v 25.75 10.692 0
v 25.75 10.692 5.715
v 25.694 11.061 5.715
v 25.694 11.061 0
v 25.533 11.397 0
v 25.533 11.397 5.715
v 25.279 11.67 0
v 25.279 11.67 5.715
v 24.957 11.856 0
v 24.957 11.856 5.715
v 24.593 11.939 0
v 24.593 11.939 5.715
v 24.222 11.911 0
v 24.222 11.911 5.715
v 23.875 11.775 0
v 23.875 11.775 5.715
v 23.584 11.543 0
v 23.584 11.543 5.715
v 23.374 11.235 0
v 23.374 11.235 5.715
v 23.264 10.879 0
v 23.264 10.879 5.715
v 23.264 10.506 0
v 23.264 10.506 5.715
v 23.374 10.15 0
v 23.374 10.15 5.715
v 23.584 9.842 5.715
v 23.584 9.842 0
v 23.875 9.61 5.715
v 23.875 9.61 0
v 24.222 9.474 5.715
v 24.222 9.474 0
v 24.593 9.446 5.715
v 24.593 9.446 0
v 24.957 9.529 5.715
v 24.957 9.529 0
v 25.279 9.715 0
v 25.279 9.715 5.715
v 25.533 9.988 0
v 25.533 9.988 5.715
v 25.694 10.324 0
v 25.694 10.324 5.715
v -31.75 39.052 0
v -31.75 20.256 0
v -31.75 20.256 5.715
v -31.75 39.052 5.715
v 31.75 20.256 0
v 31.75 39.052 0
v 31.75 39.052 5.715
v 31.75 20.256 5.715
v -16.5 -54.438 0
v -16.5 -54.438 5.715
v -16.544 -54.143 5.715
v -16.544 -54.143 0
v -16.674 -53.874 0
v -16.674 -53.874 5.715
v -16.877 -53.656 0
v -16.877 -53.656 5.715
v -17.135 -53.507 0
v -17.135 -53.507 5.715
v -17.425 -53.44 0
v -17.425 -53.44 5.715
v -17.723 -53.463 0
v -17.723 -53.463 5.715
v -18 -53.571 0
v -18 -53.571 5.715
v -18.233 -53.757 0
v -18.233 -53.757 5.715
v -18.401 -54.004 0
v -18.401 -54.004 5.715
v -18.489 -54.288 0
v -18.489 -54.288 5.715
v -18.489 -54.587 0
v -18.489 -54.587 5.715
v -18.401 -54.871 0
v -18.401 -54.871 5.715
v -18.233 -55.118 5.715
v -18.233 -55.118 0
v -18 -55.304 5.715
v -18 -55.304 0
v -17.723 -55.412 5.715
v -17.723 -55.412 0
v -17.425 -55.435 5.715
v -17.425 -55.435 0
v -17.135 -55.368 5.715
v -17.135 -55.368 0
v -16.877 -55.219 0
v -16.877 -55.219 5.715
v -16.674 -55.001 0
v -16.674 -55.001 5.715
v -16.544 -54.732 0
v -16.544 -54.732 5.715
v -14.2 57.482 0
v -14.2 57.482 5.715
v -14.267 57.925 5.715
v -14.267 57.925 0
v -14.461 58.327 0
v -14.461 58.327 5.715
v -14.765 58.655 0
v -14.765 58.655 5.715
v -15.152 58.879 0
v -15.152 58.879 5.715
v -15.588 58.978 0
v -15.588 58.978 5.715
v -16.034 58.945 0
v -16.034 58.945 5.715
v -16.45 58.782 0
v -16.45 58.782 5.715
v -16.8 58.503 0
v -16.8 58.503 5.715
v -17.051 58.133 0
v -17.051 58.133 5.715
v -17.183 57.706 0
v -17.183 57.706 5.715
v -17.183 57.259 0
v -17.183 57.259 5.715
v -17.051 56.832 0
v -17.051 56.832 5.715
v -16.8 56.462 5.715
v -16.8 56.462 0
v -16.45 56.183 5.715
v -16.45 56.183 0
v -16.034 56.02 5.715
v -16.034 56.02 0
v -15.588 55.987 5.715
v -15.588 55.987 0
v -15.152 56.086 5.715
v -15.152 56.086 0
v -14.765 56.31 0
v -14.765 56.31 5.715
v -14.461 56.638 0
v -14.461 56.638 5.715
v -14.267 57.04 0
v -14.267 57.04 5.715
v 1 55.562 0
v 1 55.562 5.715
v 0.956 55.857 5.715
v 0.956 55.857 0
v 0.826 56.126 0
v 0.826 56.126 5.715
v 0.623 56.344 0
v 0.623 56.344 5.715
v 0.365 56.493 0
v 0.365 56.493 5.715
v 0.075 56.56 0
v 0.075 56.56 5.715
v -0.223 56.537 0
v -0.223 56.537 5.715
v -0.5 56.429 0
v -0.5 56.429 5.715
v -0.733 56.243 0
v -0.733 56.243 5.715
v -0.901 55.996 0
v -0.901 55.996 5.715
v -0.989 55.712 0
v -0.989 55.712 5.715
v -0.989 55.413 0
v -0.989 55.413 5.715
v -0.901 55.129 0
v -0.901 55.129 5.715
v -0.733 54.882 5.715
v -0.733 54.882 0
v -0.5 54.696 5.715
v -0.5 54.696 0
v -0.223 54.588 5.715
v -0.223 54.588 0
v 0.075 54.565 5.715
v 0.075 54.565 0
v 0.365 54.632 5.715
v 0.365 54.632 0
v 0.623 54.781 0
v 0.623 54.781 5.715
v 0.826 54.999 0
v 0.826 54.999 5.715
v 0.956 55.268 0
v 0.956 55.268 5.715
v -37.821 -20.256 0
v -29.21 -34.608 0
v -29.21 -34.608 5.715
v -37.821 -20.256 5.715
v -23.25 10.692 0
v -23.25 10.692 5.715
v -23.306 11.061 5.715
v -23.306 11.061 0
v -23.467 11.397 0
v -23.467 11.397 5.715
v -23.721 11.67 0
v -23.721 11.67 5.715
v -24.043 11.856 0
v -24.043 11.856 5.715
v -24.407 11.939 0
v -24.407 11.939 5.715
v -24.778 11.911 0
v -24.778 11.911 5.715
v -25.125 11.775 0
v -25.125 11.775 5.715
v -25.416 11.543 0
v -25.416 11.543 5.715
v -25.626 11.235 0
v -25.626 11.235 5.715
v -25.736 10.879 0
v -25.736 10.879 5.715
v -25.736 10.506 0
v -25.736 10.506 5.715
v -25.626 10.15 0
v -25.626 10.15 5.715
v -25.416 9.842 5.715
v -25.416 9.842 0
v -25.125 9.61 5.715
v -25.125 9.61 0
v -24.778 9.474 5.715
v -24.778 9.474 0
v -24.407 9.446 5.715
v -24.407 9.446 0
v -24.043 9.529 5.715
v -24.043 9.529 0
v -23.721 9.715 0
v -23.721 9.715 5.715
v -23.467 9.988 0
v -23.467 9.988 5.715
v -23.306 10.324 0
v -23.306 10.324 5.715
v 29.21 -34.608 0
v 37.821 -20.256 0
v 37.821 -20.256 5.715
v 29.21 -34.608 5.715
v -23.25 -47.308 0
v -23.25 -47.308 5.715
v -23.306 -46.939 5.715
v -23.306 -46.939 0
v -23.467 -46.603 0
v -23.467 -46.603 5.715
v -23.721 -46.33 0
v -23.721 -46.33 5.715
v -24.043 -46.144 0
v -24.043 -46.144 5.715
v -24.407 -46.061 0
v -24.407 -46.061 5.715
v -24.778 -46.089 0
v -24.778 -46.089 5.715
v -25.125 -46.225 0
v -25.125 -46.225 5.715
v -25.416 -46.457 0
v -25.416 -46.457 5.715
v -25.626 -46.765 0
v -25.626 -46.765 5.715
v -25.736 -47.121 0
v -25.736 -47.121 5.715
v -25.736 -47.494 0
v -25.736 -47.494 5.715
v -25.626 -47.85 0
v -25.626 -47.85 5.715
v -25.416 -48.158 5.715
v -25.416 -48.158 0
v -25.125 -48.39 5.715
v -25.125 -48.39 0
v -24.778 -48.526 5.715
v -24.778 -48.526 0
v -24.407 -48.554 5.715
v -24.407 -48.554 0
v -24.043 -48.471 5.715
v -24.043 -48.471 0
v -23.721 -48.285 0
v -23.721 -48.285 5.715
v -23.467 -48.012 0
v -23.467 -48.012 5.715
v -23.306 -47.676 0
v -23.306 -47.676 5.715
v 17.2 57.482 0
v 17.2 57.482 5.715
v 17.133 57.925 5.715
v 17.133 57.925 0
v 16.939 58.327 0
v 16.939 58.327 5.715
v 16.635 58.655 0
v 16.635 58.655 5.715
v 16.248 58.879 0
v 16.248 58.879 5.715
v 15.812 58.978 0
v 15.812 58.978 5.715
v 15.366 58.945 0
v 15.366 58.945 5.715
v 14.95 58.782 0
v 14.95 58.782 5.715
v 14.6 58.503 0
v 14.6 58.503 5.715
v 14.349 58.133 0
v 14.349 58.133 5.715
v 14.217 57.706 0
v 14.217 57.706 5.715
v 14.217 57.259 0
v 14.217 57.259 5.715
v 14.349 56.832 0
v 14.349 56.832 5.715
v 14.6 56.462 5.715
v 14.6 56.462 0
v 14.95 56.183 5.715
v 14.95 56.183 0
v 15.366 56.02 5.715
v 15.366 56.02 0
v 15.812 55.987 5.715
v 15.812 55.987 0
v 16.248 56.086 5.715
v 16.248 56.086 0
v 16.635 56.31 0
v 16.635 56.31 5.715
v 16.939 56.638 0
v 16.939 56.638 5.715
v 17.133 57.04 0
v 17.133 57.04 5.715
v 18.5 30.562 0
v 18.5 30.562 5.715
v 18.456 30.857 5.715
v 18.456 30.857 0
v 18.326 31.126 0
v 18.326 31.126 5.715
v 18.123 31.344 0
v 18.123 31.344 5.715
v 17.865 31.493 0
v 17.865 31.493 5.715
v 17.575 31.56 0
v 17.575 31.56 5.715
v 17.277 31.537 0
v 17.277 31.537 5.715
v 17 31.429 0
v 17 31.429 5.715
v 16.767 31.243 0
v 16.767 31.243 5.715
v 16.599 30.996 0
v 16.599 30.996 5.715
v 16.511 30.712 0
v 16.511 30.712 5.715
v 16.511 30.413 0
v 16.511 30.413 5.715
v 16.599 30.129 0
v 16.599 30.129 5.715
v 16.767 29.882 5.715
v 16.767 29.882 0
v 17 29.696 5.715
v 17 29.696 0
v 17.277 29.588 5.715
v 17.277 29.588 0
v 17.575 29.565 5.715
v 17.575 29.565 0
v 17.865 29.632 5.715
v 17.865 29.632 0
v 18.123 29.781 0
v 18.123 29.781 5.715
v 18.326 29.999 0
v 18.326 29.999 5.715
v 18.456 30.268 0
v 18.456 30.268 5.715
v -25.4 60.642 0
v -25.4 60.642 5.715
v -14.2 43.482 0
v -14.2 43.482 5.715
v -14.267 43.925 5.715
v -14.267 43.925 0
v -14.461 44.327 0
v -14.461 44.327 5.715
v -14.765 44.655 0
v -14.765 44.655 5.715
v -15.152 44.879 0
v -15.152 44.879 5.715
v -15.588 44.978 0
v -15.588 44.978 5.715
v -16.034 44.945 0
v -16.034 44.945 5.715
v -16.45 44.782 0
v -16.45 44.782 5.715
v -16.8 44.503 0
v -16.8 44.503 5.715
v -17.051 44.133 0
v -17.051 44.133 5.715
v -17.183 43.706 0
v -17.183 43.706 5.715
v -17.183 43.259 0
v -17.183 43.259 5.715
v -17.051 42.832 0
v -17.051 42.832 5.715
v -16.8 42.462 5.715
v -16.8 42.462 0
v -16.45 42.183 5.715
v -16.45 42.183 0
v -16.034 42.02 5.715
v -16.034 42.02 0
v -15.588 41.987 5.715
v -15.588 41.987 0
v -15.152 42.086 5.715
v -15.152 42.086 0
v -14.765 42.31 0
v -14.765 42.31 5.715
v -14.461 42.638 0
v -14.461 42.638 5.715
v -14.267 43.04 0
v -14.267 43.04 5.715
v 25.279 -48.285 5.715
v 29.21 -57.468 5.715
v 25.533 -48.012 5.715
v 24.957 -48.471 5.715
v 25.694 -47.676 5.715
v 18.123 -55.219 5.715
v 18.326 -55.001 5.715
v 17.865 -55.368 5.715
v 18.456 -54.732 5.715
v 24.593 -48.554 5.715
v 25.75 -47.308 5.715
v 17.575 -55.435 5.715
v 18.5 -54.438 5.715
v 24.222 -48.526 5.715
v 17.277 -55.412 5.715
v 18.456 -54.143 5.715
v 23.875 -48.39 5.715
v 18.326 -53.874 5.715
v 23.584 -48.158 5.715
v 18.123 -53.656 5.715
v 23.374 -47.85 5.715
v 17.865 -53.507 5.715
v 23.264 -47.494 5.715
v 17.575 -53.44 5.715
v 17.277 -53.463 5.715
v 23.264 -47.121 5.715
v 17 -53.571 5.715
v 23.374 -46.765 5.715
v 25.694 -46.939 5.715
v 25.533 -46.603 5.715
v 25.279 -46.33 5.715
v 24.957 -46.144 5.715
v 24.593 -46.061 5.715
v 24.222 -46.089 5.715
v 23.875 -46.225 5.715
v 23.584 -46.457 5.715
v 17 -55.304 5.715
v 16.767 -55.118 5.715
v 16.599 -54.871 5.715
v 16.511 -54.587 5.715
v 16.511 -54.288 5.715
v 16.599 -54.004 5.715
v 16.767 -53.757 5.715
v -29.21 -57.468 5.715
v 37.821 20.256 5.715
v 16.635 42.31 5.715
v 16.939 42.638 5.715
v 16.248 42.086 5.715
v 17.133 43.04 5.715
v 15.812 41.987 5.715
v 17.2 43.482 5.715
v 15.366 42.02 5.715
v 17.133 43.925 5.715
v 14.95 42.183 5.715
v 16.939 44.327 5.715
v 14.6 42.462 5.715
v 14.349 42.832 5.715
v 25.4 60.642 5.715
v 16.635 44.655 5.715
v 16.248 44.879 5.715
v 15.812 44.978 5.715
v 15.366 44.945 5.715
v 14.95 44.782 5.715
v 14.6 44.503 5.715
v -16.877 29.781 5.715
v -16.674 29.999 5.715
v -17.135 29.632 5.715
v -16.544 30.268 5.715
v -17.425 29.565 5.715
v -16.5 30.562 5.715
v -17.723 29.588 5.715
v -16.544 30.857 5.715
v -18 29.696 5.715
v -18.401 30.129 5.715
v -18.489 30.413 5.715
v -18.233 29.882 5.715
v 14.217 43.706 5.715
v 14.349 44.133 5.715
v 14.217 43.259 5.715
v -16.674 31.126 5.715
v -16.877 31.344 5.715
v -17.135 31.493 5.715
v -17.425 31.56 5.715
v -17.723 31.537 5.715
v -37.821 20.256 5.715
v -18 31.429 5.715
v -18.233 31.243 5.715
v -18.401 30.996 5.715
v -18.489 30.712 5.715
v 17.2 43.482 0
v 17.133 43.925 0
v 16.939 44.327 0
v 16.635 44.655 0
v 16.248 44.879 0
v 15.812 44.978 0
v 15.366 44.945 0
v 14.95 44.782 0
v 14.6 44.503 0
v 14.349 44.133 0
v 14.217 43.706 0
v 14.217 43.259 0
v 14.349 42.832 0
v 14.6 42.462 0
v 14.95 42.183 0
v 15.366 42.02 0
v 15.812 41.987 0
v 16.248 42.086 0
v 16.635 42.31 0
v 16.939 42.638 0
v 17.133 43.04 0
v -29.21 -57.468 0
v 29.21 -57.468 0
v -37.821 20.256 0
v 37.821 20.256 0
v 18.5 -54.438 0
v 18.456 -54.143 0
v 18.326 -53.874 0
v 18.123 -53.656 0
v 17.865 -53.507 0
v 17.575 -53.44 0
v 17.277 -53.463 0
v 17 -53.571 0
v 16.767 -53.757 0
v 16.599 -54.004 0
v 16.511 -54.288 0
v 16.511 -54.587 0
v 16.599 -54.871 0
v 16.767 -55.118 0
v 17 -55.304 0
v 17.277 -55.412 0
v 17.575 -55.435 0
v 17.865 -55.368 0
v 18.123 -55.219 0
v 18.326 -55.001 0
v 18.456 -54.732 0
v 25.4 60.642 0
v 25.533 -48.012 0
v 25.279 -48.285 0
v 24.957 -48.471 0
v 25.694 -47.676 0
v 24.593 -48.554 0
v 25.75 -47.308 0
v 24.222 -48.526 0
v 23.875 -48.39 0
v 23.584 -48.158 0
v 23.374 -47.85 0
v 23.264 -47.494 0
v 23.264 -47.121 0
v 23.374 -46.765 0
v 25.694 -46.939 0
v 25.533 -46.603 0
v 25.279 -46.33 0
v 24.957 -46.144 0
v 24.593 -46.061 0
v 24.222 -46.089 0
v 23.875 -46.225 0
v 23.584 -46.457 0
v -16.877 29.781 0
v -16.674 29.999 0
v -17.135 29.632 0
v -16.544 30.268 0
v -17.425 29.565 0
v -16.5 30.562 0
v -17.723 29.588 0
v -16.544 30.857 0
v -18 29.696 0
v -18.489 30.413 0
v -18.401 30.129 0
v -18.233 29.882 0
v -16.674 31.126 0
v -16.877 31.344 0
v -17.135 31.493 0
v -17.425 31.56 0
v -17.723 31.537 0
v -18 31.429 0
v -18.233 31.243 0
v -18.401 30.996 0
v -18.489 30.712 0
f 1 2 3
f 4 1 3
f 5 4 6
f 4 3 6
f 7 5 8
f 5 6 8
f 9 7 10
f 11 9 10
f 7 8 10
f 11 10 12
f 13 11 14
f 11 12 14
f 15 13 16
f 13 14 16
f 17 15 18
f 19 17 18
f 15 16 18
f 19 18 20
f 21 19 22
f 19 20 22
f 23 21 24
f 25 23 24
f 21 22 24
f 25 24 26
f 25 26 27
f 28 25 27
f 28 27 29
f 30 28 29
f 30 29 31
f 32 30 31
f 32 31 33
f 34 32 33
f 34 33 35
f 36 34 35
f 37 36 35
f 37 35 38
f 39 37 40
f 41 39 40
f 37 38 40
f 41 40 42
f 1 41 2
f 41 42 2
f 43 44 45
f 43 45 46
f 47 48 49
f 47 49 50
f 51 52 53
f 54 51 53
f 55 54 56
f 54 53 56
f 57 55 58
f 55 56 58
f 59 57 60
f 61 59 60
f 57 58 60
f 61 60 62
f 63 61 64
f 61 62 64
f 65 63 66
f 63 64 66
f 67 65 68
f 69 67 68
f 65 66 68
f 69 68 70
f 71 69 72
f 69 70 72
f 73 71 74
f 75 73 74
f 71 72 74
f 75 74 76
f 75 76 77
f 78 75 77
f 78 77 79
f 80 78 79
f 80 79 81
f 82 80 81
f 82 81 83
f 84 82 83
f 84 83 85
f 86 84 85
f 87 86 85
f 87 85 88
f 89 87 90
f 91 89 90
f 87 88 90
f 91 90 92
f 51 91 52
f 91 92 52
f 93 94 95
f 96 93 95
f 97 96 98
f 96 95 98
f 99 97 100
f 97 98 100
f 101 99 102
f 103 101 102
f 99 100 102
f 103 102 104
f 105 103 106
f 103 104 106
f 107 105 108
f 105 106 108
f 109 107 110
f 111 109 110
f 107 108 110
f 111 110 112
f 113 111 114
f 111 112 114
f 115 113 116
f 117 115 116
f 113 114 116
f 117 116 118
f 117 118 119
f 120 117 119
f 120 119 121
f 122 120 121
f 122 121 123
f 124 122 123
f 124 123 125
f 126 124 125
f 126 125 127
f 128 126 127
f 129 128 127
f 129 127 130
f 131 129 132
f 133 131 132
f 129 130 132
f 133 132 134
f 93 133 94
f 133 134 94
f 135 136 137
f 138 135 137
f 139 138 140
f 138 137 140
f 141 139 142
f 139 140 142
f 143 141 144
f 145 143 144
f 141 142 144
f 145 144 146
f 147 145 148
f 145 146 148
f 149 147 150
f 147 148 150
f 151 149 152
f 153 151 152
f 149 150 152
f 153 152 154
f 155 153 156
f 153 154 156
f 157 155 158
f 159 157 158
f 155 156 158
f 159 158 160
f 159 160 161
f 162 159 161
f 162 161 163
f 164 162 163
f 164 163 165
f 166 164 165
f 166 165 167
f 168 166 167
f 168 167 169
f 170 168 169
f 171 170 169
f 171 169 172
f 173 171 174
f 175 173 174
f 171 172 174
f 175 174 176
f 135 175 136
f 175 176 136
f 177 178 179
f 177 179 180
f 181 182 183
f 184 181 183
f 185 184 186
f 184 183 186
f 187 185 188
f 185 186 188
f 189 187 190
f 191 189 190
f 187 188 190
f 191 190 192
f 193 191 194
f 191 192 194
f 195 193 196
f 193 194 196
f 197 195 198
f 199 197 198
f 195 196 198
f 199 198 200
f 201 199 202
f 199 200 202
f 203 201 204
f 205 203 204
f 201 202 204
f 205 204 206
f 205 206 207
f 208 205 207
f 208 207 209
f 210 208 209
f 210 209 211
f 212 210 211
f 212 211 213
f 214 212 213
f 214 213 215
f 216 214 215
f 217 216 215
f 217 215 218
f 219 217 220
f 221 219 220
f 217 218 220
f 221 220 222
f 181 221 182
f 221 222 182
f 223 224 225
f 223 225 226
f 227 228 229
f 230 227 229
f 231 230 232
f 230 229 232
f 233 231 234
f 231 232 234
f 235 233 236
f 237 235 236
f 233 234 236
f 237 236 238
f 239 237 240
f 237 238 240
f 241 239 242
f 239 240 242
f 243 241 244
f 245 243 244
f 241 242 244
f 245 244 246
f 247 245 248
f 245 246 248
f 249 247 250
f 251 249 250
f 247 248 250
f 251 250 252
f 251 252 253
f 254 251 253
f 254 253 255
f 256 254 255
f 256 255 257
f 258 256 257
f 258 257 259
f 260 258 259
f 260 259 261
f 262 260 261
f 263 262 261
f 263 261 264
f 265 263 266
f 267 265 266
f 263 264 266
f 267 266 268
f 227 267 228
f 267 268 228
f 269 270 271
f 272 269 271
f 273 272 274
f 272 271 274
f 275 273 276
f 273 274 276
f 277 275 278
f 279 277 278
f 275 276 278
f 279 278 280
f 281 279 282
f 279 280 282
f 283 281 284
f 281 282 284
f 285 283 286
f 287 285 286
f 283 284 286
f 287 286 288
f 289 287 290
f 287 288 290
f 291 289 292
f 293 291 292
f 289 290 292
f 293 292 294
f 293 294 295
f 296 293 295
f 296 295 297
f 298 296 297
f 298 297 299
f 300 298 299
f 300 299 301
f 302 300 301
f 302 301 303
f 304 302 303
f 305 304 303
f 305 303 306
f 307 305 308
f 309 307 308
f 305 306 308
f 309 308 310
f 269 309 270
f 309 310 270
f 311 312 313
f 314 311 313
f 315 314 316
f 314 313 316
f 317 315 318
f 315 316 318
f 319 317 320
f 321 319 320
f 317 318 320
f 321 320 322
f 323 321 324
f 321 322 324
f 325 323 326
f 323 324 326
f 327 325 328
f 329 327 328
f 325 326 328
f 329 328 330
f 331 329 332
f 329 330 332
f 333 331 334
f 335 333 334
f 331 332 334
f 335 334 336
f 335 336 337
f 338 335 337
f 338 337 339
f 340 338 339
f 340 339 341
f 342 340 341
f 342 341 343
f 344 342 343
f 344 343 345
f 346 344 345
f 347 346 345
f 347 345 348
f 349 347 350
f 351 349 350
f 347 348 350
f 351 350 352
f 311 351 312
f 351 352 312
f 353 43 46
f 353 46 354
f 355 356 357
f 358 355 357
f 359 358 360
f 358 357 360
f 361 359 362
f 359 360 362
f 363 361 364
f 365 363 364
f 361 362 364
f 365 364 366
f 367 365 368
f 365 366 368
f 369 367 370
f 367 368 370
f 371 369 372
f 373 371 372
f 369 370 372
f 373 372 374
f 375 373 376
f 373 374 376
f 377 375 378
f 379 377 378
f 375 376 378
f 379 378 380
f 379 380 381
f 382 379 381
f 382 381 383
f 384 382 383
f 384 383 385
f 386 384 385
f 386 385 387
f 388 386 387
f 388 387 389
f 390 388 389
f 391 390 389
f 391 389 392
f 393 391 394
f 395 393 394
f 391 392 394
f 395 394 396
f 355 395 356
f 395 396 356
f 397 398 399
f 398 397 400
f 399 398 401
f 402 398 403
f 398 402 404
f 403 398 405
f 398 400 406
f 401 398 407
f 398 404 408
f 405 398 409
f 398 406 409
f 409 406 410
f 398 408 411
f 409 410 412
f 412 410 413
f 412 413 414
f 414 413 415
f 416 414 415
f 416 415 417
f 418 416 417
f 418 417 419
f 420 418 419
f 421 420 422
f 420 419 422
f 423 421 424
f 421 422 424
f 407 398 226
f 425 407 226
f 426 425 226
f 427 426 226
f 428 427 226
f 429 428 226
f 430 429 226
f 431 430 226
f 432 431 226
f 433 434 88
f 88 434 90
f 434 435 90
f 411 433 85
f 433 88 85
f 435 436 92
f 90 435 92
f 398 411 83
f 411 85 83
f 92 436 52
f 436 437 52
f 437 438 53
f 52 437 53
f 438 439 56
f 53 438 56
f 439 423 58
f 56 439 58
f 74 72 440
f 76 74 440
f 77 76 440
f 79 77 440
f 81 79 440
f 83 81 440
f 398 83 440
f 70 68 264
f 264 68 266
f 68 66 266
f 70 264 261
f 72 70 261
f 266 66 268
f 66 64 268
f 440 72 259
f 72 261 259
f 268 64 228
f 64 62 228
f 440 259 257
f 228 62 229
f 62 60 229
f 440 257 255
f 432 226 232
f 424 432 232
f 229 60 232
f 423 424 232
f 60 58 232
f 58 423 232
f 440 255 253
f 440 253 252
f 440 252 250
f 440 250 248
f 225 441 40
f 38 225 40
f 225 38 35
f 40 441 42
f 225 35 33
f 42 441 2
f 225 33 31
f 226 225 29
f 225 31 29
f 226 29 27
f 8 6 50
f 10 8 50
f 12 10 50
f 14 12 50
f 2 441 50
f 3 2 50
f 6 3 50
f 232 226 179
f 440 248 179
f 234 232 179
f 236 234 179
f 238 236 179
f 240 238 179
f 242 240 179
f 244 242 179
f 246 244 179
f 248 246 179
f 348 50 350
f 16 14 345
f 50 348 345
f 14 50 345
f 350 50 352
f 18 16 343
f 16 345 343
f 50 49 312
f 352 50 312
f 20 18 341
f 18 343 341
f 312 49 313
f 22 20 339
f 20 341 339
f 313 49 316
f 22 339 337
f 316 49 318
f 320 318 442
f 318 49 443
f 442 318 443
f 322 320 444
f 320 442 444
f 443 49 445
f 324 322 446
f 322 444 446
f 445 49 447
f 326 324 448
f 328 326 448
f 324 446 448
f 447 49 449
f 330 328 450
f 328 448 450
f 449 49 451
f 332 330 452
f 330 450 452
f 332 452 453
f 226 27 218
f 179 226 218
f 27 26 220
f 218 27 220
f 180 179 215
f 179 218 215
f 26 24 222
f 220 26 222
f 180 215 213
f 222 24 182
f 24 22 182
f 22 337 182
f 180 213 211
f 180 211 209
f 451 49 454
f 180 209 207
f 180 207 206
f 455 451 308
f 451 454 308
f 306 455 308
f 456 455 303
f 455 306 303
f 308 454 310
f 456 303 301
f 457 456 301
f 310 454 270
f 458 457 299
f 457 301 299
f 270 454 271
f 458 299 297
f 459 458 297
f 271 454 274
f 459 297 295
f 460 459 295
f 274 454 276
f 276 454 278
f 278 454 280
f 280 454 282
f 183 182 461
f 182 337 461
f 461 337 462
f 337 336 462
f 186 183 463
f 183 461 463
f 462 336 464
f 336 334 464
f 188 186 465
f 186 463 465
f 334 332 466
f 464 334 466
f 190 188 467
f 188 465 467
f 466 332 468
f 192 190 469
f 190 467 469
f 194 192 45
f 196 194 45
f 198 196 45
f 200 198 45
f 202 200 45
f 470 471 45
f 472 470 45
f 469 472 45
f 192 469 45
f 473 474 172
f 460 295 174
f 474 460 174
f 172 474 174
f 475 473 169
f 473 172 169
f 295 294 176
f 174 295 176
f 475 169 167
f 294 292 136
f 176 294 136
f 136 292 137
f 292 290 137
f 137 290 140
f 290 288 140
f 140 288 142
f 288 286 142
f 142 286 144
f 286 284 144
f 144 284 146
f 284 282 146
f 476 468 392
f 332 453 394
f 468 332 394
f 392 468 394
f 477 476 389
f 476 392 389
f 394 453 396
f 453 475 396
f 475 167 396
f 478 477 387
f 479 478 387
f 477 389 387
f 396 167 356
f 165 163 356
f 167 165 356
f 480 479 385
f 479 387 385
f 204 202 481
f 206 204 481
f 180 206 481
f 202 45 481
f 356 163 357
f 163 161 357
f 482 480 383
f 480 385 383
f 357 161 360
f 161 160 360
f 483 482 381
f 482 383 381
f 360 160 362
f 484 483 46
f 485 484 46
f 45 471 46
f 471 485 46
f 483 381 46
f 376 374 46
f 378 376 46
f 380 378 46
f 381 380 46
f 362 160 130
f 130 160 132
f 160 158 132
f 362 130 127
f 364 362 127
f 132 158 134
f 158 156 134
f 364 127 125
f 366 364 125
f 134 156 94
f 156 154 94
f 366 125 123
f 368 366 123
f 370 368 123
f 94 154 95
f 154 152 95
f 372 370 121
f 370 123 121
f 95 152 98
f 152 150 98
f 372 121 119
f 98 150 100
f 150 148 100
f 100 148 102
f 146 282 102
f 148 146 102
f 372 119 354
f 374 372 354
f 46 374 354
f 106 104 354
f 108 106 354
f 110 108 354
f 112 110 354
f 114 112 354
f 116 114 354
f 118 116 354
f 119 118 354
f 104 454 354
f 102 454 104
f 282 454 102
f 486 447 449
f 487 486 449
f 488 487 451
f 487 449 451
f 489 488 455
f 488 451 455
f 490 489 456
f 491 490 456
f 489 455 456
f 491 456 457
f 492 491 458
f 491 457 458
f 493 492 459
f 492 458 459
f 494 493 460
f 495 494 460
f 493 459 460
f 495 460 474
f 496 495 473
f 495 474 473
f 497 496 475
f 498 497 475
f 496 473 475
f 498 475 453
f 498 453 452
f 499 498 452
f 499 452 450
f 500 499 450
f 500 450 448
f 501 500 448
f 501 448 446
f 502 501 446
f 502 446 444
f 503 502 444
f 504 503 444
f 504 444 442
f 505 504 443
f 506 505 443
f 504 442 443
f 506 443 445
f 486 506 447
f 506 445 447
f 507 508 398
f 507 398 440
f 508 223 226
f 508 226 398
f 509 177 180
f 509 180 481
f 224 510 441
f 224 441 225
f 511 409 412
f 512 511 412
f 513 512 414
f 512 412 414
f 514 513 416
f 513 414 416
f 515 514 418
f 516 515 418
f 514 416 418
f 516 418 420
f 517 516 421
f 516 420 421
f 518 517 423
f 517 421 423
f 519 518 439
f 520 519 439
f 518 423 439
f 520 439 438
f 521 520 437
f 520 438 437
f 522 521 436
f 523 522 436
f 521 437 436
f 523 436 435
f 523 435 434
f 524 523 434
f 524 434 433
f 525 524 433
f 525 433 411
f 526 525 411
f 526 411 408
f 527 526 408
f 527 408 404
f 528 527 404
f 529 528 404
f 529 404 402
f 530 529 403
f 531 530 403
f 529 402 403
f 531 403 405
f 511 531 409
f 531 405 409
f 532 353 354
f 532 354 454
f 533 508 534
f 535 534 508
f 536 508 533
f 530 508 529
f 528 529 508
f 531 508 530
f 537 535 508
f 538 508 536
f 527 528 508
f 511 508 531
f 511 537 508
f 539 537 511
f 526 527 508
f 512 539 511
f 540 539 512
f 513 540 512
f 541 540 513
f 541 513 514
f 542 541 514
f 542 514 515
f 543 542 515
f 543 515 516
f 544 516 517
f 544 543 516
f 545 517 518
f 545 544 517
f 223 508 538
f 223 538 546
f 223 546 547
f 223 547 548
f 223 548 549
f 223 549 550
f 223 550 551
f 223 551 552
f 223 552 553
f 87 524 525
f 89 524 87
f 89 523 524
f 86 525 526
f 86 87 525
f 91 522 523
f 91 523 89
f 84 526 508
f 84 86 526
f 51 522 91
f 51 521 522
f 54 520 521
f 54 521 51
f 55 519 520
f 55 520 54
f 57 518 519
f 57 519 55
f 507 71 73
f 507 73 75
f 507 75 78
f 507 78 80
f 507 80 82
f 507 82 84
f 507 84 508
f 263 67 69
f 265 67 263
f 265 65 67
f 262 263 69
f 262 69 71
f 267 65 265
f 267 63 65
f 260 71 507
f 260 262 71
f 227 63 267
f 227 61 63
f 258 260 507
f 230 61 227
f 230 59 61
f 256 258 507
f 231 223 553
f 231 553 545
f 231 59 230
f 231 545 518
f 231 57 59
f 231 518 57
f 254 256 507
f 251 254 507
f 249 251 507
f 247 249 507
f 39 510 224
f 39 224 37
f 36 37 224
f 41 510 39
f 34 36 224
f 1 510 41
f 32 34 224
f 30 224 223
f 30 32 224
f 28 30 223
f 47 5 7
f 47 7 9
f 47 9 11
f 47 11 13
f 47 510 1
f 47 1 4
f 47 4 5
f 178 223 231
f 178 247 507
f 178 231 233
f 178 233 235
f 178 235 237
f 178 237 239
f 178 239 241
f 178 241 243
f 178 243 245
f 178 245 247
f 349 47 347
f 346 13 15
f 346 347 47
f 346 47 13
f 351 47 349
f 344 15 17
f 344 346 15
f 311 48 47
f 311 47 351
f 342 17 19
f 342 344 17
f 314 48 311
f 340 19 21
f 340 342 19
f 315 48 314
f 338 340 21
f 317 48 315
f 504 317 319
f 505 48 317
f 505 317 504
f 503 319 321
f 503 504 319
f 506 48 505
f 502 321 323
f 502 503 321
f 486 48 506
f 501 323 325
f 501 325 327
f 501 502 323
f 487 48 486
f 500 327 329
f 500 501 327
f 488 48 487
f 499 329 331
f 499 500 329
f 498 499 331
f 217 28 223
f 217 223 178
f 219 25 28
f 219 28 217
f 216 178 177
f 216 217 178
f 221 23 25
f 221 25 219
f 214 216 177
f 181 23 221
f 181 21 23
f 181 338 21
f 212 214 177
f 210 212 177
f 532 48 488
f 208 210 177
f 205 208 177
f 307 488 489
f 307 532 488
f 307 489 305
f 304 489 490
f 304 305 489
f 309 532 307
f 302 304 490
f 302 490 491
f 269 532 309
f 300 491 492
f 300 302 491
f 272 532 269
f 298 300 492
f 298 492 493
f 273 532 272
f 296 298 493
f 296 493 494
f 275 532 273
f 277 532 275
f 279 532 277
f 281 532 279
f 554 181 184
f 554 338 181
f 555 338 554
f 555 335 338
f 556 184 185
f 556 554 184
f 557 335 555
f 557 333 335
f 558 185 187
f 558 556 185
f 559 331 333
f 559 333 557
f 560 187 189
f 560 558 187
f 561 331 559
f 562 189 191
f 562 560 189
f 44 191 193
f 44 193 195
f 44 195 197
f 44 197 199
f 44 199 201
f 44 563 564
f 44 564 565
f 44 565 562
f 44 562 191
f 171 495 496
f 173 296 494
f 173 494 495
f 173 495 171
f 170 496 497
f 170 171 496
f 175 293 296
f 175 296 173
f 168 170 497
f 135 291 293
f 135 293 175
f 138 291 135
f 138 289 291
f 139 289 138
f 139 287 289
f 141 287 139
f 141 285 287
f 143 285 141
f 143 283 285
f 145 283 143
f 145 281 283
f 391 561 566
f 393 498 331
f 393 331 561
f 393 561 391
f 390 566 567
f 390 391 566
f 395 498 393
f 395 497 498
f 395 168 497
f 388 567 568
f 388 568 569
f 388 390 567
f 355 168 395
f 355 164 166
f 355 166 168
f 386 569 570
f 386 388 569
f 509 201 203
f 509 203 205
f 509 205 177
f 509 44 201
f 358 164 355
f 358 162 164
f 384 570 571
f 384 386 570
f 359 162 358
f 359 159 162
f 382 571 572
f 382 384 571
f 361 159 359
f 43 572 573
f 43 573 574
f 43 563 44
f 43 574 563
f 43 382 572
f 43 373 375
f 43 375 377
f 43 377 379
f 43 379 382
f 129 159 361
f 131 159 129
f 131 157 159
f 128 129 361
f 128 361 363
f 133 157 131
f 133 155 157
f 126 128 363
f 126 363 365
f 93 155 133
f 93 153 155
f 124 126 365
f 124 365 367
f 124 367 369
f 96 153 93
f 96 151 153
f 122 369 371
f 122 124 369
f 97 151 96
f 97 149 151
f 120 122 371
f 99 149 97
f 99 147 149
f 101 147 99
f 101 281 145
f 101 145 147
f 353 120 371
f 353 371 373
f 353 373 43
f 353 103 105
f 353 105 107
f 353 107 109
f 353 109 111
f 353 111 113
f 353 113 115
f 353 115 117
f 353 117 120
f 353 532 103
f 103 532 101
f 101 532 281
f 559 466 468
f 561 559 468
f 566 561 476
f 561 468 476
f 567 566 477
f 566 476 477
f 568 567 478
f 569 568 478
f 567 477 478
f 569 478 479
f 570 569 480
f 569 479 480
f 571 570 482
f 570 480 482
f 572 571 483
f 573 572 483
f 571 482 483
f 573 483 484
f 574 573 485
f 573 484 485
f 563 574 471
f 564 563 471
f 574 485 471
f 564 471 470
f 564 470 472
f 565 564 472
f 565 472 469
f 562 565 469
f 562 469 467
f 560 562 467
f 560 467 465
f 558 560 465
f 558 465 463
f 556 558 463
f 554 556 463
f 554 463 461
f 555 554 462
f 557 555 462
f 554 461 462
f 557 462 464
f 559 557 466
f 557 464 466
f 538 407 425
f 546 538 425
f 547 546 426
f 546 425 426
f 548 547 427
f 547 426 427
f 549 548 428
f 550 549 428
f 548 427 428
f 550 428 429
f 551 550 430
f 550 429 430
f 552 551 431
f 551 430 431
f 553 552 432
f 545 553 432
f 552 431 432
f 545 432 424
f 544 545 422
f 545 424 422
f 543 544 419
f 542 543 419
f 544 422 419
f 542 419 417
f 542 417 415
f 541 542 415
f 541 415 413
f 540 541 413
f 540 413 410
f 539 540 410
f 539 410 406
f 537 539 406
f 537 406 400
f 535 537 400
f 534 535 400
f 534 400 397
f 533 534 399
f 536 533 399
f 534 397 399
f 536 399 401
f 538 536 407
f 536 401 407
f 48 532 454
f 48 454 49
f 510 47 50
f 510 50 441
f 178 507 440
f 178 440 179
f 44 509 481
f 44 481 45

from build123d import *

# Parameters (mm, degrees)
BOSS_EXTRUDE1_DEPTH = 5.715
SKETCH3_R           = 1.25
SKETCH3_R_2         = 1
SKETCH3_R_3         = 1.5
CUT_EXTRUDE1_DEPTH  = 5.715


with BuildPart() as part:
    # Sketch1 → Boss-Extrude1 (new body)
    with BuildSketch(Plane.XY):
        Polygon((-37.8206, -20.2565), (-37.8206, 20.2565), (-31.75, 20.2565), (-31.75, 39.0525), (-25.4, 60.6425), (25.4, 60.6425), (31.75, 39.0525), (31.75, 20.2565), (37.8206, 20.2565), (37.8206, -20.2565), (29.21, -34.6075), (29.21, -57.4675), (-29.21, -57.4675), (-29.21, -34.6075), align=None)
    extrude(amount=BOSS_EXTRUDE1_DEPTH)

    # Sketch3 → Cut-Extrude1 (cut)
    with BuildSketch(Plane.XY.offset(5.715)):
        with Locations((-24.5, 10.6925)):
            Circle(SKETCH3_R)
        with Locations((24.5, 10.6925)):
            Circle(SKETCH3_R)
        with Locations((-24.5, -47.3075)):
            Circle(SKETCH3_R)
        with Locations((24.5, -47.3075)):
            Circle(SKETCH3_R)
        with Locations((0, 55.5625)):
            Circle(SKETCH3_R_2)
        with Locations((17.5, 30.5625)):
            Circle(SKETCH3_R_2)
        with Locations((-17.5, 30.5625)):
            Circle(SKETCH3_R_2)
        with Locations((-17.5, -54.4375)):
            Circle(SKETCH3_R_2)
        with Locations((17.5, -54.4375)):
            Circle(SKETCH3_R_2)
        with Locations((-15.7, 57.48249997)):
            Circle(SKETCH3_R_3)
        with Locations((15.7, 57.48249997)):
            Circle(SKETCH3_R_3)
        with Locations((15.7, 43.48249997)):
            Circle(SKETCH3_R_3)
        with Locations((-15.7, 43.48249997)):
            Circle(SKETCH3_R_3)
    extrude(amount=-CUT_EXTRUDE1_DEPTH, mode=Mode.SUBTRACT)


solid = part.part
